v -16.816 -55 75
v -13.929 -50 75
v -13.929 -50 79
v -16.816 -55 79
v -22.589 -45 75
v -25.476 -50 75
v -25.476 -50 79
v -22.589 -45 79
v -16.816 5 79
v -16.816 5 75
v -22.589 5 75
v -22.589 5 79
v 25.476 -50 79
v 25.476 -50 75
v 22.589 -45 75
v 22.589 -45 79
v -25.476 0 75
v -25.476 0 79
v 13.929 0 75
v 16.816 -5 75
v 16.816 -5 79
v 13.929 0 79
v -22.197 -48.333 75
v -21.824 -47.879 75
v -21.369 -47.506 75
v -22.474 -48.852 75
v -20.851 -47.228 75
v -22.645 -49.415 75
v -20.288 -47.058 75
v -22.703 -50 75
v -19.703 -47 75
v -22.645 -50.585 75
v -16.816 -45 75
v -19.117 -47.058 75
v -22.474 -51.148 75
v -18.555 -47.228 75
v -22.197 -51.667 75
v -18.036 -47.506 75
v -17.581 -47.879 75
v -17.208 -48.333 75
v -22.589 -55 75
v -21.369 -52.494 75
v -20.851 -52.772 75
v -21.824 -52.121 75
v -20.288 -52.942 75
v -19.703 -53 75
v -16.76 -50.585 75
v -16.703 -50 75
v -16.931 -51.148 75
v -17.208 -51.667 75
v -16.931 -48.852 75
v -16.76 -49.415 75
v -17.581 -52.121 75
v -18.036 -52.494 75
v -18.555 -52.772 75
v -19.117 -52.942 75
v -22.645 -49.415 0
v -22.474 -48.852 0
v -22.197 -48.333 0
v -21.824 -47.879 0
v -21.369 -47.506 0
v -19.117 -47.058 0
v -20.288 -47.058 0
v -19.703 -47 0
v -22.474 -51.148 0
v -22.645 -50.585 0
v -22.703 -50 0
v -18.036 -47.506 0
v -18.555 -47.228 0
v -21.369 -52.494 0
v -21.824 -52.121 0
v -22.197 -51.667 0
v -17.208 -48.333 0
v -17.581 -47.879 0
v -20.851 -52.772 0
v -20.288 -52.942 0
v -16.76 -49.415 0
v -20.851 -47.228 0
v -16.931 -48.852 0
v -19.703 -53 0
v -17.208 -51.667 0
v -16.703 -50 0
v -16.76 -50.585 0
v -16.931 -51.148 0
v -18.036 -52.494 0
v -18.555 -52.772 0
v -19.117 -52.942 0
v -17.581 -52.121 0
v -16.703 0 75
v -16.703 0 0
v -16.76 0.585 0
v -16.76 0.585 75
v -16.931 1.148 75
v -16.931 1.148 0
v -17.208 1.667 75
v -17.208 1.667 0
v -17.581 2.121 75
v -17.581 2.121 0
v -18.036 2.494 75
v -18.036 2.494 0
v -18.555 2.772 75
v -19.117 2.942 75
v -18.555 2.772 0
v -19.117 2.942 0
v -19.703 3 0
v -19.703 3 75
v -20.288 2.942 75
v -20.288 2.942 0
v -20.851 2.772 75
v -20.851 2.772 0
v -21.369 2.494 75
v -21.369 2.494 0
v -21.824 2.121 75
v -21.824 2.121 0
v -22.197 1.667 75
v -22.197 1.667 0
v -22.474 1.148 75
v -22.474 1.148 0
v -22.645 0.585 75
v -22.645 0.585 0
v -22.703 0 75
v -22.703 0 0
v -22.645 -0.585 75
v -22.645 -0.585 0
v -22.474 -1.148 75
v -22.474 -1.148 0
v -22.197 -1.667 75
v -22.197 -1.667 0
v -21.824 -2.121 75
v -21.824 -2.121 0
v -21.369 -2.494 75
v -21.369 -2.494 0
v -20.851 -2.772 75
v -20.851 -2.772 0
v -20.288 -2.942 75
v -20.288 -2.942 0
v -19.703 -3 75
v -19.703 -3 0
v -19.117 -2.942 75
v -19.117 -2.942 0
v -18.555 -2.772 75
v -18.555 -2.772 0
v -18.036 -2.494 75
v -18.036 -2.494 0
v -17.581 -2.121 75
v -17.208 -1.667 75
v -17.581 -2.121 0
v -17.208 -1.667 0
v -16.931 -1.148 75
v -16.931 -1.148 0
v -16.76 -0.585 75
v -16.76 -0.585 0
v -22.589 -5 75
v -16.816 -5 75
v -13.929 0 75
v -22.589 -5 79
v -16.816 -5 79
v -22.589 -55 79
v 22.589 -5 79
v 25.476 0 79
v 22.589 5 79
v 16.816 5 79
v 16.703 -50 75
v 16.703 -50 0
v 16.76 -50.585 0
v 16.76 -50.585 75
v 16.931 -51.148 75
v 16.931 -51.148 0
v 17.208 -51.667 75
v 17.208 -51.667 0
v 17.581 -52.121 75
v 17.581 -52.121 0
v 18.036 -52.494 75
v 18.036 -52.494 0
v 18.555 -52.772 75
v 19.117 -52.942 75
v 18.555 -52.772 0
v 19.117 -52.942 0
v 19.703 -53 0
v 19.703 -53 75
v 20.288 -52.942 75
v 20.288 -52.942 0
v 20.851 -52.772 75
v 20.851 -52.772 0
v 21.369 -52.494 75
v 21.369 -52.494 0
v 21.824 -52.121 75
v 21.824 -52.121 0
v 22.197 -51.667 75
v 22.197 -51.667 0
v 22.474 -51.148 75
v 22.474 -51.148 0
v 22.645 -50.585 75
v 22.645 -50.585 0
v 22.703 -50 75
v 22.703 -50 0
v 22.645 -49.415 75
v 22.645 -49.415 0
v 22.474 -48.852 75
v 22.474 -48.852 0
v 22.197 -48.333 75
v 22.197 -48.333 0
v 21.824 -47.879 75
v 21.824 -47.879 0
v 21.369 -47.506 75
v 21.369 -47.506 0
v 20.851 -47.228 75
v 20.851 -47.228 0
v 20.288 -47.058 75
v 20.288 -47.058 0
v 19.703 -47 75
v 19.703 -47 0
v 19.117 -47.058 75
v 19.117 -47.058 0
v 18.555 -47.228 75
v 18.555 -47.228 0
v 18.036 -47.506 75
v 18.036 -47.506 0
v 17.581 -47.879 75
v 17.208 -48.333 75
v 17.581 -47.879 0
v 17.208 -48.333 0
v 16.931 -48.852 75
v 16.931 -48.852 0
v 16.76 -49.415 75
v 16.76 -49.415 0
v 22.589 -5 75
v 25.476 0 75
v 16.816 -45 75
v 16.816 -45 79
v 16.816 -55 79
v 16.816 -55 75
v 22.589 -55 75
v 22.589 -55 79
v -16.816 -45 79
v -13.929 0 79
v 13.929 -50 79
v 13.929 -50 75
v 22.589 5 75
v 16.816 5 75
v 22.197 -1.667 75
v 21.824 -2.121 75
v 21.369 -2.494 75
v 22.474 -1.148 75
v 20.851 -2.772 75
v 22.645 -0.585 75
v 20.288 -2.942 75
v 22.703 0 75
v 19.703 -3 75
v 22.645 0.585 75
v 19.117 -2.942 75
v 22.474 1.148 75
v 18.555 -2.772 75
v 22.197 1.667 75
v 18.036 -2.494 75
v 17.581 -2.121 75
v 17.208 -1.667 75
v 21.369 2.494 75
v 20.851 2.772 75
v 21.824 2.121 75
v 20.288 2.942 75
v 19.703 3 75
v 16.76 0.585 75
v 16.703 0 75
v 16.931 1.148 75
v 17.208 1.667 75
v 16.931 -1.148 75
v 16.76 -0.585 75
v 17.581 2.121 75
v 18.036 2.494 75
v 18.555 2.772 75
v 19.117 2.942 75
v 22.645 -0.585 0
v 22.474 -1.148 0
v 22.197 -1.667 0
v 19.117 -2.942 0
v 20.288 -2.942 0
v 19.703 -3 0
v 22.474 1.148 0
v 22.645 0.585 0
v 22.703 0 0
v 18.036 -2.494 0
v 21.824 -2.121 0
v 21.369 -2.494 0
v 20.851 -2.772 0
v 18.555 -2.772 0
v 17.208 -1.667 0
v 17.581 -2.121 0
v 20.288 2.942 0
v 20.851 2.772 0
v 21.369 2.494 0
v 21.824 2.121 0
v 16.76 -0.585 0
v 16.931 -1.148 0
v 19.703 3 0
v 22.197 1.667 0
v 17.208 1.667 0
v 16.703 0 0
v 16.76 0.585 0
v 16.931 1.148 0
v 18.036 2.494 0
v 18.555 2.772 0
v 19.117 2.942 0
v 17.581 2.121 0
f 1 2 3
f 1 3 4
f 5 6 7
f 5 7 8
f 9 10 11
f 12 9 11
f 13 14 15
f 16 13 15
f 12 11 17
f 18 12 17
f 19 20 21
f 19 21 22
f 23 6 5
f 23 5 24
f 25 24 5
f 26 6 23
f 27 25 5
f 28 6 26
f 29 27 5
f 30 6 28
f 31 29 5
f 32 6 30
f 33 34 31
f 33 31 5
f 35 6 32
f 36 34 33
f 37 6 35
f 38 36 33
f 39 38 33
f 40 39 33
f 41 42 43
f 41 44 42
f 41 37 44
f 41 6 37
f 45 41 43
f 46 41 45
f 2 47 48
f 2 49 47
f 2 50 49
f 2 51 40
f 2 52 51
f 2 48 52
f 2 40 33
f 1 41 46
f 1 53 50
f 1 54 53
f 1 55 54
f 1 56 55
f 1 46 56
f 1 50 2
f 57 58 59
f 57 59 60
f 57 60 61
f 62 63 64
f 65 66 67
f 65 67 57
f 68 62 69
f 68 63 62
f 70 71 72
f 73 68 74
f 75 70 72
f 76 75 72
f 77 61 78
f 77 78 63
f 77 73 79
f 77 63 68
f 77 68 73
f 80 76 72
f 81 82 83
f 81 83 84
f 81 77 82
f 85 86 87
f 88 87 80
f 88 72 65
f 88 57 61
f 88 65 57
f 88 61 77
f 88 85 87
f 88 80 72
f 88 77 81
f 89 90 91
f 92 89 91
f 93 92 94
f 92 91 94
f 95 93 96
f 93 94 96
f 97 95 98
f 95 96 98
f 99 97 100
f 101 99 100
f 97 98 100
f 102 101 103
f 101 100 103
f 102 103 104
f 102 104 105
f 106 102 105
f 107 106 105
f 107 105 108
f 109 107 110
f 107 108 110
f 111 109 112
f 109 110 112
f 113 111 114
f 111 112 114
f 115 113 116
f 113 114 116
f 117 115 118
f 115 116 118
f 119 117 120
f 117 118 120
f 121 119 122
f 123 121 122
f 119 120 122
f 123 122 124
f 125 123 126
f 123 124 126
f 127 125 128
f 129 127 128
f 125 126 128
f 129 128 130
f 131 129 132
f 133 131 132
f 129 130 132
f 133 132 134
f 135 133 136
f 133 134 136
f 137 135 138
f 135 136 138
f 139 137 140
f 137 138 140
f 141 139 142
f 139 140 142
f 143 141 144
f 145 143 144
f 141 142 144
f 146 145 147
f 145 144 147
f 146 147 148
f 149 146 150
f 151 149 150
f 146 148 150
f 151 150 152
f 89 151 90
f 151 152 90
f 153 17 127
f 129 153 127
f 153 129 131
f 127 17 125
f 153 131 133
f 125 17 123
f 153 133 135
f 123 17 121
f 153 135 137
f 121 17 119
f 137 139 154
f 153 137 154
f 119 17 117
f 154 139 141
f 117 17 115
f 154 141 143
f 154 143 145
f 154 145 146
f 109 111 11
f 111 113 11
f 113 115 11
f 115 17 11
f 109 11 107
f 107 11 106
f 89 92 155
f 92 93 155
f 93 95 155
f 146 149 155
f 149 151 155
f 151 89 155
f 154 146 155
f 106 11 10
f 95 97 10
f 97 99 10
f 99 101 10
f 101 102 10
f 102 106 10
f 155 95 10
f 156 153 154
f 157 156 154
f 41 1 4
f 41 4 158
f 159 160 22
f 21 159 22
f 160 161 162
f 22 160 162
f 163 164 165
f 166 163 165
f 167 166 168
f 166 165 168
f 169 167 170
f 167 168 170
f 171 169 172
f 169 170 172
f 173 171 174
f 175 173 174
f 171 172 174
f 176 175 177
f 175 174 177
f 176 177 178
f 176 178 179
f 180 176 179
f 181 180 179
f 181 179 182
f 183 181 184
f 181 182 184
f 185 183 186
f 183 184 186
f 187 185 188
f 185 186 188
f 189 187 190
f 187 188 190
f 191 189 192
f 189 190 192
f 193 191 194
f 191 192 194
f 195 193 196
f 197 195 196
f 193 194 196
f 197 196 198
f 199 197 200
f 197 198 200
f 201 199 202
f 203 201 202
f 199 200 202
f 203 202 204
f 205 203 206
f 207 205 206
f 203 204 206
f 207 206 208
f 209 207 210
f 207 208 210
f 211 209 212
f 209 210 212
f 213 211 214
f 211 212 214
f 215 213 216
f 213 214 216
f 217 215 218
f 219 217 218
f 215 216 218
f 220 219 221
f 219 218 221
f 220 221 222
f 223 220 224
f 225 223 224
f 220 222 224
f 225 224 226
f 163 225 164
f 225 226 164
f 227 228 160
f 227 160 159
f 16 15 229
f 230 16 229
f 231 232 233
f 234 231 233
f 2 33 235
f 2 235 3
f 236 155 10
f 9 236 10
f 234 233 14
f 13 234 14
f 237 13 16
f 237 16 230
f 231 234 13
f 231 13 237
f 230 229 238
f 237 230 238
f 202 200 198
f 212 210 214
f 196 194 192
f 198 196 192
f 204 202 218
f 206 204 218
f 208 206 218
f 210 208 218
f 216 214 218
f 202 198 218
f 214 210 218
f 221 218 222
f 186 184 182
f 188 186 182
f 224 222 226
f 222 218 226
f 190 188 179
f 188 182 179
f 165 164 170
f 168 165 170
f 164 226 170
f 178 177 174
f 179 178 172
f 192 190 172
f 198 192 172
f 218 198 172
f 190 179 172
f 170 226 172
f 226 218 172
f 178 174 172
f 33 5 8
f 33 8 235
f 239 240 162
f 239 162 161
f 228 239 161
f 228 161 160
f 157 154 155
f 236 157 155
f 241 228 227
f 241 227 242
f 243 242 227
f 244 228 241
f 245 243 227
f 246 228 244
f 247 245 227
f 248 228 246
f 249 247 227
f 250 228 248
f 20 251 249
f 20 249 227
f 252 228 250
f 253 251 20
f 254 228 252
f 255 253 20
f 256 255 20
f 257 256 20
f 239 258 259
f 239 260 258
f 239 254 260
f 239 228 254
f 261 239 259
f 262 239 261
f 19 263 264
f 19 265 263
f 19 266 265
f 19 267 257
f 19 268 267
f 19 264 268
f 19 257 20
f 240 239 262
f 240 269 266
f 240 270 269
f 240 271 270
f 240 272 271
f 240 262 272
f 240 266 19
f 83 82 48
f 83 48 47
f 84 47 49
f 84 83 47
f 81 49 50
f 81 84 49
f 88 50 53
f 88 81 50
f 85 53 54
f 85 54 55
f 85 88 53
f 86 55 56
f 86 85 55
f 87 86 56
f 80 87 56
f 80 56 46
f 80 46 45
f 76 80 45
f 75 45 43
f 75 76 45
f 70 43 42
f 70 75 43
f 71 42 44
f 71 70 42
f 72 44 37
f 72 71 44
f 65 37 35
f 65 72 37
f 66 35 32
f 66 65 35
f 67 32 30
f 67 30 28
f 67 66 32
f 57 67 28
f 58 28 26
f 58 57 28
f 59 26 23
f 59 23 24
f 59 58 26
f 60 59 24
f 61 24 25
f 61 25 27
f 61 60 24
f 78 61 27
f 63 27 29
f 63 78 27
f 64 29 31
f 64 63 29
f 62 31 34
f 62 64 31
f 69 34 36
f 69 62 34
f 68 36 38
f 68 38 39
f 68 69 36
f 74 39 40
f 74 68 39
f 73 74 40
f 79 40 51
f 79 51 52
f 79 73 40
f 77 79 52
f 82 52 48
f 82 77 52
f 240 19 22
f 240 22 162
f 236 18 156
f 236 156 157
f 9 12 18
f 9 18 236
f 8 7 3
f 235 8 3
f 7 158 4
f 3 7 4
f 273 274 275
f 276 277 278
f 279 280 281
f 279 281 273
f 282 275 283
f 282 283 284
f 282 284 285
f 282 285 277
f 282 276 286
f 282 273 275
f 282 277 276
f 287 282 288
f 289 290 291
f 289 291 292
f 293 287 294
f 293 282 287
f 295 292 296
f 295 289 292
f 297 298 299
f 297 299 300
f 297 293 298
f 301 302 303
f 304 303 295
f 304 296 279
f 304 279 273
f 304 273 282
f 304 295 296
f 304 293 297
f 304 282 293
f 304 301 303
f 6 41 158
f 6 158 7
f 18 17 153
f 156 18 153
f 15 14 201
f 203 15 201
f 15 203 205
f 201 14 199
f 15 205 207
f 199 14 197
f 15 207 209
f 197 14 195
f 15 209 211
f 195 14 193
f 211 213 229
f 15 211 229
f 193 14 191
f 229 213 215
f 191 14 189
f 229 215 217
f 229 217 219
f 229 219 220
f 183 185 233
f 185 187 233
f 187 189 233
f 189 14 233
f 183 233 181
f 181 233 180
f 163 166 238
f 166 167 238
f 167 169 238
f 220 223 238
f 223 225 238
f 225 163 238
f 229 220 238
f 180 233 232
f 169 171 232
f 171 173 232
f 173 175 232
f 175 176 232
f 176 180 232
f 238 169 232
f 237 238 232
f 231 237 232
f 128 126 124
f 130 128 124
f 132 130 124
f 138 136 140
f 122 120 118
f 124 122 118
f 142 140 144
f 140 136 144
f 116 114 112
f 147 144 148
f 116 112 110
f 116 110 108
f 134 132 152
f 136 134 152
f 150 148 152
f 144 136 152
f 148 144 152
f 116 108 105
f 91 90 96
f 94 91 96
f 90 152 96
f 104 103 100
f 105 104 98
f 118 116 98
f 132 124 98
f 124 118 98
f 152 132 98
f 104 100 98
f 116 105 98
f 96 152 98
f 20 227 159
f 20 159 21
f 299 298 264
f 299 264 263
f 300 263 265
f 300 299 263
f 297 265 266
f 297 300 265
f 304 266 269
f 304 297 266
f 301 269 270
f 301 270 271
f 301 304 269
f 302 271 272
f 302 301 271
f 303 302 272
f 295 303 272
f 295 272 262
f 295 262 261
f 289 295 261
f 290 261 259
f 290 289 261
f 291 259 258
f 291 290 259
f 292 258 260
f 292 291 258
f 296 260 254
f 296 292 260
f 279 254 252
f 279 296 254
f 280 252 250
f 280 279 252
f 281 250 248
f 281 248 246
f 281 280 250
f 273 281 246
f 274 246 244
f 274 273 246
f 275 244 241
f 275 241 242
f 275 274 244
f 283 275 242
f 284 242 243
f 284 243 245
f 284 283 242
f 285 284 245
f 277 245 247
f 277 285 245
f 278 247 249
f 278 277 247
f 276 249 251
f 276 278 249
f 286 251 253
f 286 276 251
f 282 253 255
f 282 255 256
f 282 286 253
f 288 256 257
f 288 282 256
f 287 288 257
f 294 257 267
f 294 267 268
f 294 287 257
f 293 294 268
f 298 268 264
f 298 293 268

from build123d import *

# Parameters (mm, degrees)
F0_R     = 3
F1_DEPTH = 75
F3_DEPTH = 4


with BuildPart() as f1:
    # F0 (on Top) → F1 (new body)
    with BuildSketch(Plane.XY):
        with Locations((-8.5166577033, 0)):
            Circle(F0_R)
    extrude(amount=F1_DEPTH)


with BuildPart() as f1b:
    # F0 (on Top) → F1, piece 2 (new body)
    with BuildSketch(Plane.XY):
        with Locations((-19.7027108801, 0)):
            Circle(F0_R)
    extrude(amount=F1_DEPTH)

    # F2 (on face) → F3 (join)
    with BuildSketch(Plane.XY.offset(75)):
        Polygon((-16.8159595341, 5), (-22.589462226, 5), (-25.4762135719, 0), (-22.589462226, -5), (-16.8159595341, -5), (-13.9292081882, 0), align=None)
    extrude(amount=F3_DEPTH)


with BuildPart() as f1c:
    # F0 (on Top) → F1, piece 3 (new body)
    with BuildSketch(Plane.XY):
        with Locations((8.7708764974, 0)):
            Circle(F0_R)
    extrude(amount=F1_DEPTH)


with BuildPart() as f1d:
    # F0 (on Top) → F1, piece 4 (new body)
    with BuildSketch(Plane.XY):
        with Locations((16.9061870563, 0)):
            Circle(F0_R)
    extrude(amount=F1_DEPTH)


with BuildPart() as f6_1:
    # F6: instance of F1b
    add(f1b.part.mirror(Plane.YZ))


with BuildPart() as f8_1:
    # F8: instance of F1b
    add(f1b.part.mirror(Plane.XZ.offset(25)))


with BuildPart() as f9_1:
    # F9: instance of F6_1
    add(f6_1.part.mirror(Plane.XZ.offset(25)))


solid = Compound([f1b.part, f6_1.part, f8_1.part, f9_1.part])
